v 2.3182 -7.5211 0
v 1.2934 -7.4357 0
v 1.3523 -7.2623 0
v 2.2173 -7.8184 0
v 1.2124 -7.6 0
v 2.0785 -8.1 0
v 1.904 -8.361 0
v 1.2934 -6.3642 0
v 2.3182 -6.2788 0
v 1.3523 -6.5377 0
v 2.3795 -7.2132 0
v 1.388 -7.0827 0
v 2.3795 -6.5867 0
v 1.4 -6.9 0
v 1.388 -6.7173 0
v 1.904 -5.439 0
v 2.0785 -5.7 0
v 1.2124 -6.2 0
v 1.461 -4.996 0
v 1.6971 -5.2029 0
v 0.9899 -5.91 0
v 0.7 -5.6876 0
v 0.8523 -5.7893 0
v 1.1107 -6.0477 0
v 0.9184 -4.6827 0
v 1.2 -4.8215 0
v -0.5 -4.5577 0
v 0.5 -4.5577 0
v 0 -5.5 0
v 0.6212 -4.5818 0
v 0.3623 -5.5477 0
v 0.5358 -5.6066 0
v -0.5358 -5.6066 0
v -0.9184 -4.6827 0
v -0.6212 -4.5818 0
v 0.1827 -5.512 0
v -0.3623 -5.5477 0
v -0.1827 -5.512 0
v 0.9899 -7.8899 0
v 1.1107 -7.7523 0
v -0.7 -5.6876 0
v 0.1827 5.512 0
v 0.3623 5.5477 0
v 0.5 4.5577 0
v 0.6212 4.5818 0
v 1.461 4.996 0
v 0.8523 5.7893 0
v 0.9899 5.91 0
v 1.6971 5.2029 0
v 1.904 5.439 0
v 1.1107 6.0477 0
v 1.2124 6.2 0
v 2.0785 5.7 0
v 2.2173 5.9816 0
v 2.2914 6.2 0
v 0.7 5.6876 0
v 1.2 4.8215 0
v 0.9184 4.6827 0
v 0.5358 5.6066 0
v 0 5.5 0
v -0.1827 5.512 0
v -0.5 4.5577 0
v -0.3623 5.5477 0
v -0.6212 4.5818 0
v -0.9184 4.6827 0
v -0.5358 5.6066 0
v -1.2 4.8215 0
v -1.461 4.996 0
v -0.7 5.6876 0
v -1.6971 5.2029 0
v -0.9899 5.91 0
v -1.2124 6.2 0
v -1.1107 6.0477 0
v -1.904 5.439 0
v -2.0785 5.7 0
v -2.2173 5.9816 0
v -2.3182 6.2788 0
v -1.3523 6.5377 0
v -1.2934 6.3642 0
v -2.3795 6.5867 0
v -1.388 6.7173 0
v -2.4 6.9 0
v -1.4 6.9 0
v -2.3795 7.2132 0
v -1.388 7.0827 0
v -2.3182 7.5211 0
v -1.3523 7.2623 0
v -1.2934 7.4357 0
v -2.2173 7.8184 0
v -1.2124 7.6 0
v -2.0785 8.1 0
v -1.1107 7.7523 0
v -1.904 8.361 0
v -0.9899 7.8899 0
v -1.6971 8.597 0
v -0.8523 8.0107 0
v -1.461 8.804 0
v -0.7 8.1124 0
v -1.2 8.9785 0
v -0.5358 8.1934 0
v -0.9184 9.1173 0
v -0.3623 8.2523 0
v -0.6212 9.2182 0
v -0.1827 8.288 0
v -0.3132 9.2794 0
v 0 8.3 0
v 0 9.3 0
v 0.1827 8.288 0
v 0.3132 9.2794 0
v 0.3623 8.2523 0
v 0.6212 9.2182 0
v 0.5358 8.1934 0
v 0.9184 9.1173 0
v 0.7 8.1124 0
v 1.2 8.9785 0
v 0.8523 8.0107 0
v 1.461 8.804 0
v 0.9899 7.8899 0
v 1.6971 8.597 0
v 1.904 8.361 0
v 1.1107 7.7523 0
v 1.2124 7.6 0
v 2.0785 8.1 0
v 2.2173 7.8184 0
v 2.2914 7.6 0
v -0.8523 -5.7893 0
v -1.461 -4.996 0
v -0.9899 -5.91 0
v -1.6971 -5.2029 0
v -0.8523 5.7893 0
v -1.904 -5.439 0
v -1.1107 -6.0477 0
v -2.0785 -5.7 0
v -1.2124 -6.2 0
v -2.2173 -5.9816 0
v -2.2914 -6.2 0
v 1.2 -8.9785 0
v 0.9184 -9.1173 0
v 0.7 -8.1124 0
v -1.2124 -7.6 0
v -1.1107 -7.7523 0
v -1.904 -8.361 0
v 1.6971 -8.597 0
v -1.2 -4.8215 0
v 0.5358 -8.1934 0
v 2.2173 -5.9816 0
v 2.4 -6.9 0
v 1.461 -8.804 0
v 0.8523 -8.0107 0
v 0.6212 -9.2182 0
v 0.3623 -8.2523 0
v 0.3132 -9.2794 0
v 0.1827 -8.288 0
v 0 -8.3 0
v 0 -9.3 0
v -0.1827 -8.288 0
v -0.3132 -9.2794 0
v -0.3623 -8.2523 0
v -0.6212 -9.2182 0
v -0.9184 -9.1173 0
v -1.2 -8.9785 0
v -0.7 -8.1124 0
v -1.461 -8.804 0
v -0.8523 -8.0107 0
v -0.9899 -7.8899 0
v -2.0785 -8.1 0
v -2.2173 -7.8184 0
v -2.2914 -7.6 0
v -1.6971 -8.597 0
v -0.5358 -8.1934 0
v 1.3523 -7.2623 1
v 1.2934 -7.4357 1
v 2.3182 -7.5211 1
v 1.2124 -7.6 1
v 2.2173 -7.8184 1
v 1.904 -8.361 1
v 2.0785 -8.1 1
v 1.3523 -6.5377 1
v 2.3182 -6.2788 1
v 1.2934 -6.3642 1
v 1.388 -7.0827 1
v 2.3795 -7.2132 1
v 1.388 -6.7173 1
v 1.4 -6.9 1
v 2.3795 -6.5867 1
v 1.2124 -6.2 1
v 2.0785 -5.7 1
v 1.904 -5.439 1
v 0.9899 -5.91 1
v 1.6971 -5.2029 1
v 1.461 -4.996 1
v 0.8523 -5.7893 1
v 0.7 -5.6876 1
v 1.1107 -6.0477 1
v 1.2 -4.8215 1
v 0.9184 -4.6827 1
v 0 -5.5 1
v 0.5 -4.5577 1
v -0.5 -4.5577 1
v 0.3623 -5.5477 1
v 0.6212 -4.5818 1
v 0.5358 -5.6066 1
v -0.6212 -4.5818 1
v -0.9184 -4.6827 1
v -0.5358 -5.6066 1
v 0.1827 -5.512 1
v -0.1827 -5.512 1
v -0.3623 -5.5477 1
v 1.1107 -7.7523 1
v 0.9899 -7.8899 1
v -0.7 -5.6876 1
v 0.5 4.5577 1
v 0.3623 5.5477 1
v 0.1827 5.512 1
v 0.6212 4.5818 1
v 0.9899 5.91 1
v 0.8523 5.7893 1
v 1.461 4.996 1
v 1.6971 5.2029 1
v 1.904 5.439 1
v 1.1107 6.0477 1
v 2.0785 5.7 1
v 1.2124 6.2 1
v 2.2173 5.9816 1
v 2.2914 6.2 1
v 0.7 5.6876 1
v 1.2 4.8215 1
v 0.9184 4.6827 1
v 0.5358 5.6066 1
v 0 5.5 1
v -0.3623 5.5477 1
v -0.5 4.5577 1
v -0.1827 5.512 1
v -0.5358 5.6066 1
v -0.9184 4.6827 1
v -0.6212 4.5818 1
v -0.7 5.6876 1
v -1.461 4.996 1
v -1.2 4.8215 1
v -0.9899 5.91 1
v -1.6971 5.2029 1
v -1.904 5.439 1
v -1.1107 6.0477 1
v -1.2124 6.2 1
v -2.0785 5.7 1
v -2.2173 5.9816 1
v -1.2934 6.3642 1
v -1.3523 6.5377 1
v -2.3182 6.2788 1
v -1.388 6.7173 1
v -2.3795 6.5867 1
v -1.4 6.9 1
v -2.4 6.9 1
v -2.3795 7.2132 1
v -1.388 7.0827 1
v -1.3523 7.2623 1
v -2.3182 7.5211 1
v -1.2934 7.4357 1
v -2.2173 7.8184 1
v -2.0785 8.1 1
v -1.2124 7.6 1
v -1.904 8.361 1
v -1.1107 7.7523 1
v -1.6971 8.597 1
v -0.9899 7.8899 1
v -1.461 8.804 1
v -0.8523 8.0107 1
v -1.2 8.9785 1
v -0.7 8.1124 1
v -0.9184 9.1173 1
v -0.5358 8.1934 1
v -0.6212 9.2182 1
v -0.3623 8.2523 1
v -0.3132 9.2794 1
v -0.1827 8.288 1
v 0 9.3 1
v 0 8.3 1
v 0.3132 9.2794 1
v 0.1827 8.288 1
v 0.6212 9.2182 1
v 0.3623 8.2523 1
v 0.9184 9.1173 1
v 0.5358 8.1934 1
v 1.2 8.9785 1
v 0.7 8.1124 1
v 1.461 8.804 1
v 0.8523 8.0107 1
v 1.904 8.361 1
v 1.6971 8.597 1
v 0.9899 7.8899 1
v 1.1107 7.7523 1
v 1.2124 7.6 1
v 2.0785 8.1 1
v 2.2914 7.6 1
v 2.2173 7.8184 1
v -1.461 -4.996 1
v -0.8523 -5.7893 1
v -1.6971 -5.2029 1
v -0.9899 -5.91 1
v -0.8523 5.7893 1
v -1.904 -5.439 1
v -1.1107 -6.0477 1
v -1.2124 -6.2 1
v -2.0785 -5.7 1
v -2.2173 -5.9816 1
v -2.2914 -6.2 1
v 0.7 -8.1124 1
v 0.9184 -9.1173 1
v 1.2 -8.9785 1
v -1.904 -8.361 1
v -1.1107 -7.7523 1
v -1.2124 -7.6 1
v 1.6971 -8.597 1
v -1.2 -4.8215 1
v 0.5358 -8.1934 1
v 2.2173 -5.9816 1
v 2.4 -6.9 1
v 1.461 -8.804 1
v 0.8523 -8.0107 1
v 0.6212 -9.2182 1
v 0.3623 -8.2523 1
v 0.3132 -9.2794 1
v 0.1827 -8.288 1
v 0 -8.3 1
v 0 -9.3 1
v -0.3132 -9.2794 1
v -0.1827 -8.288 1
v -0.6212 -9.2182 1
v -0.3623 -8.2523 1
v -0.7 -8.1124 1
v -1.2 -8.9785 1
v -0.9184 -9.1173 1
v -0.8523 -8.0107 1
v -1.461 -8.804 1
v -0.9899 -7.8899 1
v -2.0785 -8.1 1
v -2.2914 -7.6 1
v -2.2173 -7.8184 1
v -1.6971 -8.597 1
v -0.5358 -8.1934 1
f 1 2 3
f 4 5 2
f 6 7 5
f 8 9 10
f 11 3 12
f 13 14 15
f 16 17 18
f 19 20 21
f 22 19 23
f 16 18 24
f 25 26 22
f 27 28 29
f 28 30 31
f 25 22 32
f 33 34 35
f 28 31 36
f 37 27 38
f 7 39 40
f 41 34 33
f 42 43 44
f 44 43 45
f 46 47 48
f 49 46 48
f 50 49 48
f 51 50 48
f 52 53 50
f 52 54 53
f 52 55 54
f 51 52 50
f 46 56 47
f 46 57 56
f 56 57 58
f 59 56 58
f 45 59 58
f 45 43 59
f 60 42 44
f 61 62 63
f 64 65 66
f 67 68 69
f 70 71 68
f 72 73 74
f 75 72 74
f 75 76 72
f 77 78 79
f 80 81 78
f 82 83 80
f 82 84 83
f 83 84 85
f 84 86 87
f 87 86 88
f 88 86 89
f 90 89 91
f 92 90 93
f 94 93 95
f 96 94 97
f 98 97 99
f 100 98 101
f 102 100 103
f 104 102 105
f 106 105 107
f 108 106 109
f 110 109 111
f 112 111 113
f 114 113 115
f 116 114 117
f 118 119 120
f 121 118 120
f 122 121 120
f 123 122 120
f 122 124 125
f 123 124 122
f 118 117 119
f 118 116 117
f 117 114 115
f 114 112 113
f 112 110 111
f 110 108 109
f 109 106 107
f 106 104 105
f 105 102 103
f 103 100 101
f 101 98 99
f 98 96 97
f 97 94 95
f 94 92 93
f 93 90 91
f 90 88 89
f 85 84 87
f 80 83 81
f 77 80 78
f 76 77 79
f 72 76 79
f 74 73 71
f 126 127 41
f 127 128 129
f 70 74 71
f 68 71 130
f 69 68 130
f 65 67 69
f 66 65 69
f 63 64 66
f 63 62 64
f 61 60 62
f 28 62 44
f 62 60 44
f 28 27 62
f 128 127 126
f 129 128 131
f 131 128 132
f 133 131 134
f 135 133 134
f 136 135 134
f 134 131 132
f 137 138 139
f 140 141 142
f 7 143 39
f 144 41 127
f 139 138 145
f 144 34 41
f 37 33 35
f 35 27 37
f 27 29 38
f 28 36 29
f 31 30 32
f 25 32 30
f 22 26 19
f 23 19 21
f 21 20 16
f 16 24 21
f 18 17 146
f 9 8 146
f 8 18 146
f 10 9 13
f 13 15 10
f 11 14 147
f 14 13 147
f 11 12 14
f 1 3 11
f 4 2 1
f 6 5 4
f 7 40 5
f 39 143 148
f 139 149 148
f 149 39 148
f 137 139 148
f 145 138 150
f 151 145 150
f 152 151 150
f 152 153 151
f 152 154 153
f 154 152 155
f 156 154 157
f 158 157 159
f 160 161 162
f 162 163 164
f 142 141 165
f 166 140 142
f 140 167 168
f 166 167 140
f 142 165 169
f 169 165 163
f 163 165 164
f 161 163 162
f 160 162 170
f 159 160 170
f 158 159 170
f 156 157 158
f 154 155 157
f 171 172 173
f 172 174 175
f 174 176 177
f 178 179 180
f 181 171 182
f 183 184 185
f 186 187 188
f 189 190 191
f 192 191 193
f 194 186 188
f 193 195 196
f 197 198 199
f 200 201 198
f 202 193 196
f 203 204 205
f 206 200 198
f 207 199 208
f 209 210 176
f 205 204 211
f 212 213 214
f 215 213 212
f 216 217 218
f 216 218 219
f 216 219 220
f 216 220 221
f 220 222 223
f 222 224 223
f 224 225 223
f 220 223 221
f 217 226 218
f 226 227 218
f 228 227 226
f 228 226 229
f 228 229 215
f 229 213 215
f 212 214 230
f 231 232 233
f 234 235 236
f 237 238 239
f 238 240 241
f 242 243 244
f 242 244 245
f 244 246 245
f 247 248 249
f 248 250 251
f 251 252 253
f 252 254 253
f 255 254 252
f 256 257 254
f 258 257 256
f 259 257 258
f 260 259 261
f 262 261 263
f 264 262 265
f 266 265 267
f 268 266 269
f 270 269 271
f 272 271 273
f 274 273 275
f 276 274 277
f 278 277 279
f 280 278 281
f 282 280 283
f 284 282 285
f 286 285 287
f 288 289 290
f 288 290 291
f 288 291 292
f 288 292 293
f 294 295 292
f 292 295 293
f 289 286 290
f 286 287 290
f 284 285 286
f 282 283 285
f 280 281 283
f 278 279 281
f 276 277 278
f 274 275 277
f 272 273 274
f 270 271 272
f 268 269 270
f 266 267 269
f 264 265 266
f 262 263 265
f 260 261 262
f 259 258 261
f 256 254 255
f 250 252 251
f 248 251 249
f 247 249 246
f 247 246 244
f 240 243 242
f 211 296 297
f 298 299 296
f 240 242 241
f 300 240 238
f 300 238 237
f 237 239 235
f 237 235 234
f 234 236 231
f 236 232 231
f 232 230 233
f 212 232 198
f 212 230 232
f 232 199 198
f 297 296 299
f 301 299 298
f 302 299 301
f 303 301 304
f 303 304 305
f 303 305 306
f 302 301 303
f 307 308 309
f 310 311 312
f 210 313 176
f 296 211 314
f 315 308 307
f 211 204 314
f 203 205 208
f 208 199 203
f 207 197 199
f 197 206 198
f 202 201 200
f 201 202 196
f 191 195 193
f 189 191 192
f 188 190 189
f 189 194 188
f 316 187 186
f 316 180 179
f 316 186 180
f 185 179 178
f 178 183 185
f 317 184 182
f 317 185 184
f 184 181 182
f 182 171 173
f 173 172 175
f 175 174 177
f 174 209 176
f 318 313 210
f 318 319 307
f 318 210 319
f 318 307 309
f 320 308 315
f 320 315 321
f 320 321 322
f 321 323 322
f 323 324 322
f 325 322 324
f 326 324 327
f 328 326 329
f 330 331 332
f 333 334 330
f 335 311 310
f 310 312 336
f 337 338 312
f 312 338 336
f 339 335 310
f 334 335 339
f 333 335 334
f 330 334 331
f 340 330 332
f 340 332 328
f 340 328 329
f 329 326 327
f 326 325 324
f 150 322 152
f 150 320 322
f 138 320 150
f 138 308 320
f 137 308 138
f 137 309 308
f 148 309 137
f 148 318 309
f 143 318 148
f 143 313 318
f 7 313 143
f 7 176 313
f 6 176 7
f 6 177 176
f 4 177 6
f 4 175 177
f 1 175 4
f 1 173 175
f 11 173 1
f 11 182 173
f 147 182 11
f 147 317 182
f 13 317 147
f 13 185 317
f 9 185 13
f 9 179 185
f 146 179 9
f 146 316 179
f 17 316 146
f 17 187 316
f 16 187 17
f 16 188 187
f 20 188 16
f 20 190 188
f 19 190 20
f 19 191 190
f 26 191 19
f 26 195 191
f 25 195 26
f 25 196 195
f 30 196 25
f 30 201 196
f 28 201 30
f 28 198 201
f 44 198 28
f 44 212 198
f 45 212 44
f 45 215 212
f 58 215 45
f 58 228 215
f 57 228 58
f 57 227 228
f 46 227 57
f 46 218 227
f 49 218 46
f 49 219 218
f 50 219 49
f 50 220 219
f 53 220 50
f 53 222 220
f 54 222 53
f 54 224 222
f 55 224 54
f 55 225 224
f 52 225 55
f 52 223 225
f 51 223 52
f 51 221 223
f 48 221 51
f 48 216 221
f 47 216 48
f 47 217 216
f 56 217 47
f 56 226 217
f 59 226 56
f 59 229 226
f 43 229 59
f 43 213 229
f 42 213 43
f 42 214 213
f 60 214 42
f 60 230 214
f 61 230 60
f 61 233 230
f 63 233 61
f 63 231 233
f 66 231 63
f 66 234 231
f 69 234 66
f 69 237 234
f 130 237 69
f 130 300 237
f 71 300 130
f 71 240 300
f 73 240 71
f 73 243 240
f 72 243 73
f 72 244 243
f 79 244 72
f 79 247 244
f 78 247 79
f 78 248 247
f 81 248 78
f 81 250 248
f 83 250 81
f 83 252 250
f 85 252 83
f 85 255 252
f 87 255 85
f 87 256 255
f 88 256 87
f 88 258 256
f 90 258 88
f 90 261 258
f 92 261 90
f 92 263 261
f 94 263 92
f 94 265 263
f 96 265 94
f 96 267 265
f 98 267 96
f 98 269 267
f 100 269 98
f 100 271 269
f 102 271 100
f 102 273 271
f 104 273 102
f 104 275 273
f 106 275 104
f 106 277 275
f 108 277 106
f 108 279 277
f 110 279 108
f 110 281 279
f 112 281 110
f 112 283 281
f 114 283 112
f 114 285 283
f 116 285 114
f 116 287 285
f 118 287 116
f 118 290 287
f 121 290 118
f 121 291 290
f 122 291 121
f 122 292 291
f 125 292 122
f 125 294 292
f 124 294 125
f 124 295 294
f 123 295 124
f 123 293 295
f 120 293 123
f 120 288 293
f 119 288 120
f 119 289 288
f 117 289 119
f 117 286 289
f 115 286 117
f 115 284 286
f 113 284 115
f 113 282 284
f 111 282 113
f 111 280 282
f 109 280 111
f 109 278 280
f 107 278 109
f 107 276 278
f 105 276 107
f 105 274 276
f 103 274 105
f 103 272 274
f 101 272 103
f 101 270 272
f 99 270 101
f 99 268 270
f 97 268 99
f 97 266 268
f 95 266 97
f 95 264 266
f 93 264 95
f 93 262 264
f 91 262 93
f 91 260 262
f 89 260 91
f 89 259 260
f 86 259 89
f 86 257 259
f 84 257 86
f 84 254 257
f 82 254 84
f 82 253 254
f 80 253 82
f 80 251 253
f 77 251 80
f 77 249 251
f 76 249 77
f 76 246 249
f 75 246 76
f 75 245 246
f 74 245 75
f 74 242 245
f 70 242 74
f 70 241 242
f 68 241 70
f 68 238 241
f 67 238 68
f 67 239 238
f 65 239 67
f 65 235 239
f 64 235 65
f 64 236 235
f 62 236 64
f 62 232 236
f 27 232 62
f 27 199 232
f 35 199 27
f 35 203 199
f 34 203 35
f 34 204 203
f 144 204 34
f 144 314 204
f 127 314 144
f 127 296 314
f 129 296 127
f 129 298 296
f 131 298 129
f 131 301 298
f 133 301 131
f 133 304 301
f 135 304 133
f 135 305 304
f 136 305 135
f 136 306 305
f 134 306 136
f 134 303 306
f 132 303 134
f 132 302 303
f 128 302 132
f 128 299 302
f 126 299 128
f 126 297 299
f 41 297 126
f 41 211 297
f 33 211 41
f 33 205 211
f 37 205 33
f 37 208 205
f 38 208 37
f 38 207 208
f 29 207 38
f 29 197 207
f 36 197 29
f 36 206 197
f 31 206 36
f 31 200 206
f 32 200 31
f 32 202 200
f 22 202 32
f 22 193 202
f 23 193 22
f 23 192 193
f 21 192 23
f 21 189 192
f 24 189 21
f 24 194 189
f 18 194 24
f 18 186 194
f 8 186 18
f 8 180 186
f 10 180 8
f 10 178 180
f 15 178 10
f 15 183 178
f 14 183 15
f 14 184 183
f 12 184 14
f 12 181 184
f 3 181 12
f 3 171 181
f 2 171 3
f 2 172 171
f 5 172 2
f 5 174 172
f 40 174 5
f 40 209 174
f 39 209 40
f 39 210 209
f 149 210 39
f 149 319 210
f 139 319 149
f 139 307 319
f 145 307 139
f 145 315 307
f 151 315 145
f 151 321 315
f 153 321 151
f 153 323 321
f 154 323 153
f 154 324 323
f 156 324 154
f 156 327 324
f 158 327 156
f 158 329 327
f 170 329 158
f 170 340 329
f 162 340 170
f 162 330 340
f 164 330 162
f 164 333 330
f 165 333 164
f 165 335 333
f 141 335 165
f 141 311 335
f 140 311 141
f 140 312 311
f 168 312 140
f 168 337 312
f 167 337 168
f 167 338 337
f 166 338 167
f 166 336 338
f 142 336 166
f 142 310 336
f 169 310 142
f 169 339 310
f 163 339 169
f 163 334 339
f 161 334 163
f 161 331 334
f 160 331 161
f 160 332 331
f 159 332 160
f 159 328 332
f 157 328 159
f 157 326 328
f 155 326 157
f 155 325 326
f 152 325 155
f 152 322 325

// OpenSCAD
// A link to join snowflakes: a straight bar with an open hook at each end. Each hook
// slips through the ring at an arm tip. Print it flat. MIT licence; see LICENSE.

/* [Link] */
// Length of the bar between the hooks (mm)
length = 10; // [4:1:40]
// Width and thickness of the link's wire (mm)
width = 1; // [0.6:0.1:2]

/* [Hidden] */
$fn = 48;
HOOK_IN = 1.4; // inside radius of a hook: room for a tip ring's 1 mm band
GAP = 1.4; // the hook's opening, wide enough to pass the band through

// One hook, centred at the origin, open toward +x.
module hook() {
    difference() {
        circle(r=HOOK_IN + width);
        circle(r=HOOK_IN);
        translate([0, -GAP / 2]) square([HOOK_IN + width + 1, GAP]);
    }
}

linear_extrude(width) {
    translate([-width / 2, -length / 2]) square([width, length]);
    for (s = [-1, 1]) translate([0, s * (length / 2 + HOOK_IN + width / 2)]) rotate(s > 0 ? 0 : 180) hook();
}
